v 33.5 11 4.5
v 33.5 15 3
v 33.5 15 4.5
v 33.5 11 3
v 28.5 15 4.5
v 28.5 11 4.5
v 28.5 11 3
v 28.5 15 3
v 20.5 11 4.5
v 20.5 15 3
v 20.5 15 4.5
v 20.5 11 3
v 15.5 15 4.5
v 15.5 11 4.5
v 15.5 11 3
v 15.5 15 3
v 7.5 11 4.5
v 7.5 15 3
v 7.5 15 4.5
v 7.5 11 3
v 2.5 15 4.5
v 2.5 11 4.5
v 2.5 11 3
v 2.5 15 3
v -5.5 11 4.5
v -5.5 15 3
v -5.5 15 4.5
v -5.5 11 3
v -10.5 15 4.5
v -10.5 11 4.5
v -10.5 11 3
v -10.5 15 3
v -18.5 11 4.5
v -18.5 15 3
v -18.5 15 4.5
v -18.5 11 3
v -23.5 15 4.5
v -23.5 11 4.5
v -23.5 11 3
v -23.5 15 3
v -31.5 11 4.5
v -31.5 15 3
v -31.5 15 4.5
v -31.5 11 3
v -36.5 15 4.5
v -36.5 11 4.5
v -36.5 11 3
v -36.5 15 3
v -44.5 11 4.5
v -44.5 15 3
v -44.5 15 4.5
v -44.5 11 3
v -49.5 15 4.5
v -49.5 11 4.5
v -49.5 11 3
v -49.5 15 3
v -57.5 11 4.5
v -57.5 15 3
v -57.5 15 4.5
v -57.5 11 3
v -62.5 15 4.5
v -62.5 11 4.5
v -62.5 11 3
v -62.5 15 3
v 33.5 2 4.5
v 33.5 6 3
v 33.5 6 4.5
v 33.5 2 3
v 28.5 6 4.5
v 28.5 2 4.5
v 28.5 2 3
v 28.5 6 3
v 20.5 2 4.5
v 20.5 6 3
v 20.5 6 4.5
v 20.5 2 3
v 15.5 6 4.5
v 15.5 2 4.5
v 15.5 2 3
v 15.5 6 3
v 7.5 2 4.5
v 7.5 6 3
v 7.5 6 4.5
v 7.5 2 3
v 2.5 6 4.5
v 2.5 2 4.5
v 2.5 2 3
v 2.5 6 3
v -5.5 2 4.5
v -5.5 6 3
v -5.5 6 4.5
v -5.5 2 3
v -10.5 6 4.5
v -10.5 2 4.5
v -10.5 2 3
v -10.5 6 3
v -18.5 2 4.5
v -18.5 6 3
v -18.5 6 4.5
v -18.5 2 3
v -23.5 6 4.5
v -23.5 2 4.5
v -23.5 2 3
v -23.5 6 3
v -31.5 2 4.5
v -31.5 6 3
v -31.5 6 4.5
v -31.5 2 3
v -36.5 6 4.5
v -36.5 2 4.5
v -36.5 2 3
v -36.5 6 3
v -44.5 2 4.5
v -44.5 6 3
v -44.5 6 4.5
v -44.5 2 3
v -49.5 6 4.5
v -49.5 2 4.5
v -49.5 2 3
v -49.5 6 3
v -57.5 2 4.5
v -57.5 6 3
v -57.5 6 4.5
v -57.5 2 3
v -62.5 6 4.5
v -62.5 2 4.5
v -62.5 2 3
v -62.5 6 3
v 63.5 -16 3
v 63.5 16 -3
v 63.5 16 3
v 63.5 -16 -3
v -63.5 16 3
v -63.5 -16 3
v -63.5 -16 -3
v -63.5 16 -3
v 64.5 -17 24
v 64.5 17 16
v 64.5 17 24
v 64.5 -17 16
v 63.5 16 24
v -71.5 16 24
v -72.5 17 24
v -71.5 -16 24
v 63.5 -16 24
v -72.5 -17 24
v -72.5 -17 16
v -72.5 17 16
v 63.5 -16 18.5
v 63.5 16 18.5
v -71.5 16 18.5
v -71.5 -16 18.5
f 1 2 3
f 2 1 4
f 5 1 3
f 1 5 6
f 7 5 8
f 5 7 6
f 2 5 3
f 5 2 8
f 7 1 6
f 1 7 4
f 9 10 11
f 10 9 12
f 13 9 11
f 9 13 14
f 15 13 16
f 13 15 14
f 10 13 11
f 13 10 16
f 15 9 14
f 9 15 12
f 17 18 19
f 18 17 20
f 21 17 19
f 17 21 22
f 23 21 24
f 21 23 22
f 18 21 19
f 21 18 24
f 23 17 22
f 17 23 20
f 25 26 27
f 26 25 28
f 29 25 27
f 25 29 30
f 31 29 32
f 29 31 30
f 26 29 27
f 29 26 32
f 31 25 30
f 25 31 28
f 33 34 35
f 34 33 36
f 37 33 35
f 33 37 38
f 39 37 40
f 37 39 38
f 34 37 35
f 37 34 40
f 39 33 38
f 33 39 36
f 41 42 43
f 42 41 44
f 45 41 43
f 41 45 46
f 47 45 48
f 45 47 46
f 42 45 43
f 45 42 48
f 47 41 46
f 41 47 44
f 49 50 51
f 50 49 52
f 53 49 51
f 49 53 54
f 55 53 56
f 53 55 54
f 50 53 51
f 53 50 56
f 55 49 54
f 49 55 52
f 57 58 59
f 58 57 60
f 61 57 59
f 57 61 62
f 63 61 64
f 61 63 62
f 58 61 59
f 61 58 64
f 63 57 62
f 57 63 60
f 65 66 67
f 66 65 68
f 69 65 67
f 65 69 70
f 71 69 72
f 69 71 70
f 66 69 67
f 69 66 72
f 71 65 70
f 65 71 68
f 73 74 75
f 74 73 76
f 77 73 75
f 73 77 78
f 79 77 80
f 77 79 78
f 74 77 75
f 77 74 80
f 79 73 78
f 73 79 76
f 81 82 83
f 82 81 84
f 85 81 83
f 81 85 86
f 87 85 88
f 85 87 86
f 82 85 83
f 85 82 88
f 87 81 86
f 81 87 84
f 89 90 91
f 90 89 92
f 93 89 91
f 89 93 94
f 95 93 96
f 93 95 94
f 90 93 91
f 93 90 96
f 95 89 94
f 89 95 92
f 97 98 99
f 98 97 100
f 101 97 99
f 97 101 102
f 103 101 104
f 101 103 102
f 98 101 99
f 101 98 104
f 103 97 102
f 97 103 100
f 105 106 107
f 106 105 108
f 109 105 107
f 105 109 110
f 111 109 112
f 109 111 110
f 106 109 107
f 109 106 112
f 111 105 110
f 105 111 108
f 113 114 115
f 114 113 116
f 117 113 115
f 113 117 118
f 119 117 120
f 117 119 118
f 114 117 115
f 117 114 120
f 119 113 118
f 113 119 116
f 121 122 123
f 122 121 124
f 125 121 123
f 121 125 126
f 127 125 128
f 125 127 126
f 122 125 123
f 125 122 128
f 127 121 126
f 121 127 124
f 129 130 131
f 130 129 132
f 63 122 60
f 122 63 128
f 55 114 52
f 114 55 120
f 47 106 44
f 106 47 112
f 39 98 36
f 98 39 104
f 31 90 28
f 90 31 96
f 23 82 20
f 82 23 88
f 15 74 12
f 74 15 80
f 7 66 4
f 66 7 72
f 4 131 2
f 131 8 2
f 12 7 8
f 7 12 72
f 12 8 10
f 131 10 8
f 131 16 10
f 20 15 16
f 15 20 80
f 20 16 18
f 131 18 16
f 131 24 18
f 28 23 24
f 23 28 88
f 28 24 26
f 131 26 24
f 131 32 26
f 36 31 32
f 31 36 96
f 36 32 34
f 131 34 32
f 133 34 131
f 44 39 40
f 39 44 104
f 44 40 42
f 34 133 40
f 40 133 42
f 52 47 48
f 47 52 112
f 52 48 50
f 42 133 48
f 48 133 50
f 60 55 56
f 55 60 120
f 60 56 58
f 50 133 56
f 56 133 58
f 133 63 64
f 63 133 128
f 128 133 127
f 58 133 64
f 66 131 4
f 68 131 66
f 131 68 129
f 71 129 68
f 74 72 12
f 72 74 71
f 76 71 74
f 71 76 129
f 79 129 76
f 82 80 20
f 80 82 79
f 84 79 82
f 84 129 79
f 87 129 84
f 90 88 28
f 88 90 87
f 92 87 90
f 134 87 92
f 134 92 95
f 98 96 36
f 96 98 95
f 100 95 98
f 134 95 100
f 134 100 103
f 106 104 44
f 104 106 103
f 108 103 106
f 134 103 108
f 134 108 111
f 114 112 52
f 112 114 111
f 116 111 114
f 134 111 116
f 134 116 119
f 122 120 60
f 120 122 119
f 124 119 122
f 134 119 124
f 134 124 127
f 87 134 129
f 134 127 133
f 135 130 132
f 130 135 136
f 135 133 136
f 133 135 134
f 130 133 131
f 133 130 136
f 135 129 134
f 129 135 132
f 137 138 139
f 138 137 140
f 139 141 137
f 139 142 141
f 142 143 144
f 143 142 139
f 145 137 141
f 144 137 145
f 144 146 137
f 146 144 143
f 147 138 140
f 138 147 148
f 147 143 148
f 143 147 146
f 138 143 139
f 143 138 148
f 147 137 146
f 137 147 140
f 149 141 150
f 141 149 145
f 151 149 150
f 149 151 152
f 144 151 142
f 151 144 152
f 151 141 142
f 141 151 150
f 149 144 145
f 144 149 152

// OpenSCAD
	  boardLength=127;      // including USB port protruding 
	  boardWidth=32;
	  boardHeight=6;
	  wallThickness=3;      // including USB port protruding
	  IRLength=5;         // individual IR emitter/receiver measurements including IC legs
	  IRWidth=4;          // 
	  IRHeight=2;
	  xSpaceBetweenGates=13;
	  ySpaceBetweenGates=9;
	  

	 module get_board_vol(){  
	 //Estimates the volume of the cuboid needed to fit the board in red (taking max values for height so that the USB port has enough space), space for IR sensors (bottom of board) are in yellow 
	
	      color("red")
	      cube([boardLength,boardWidth,boardHeight],center=true);
	      // make 8 yellow IR sensors
	      translate([-32,-2.5,0]) // positioning of the 8 gates
	      get_8_gates();
	      translate([-32,-2.5-ySpaceBetweenGates,0]) // positioning of the 8 gates
	      get_8_gates();	      

	      }
	module get_8_gates(){
	        for (i=[0:7])
	      translate([boardLength/2-0.5-xSpaceBetweenGates*i,boardWidth/2-0.5,boardHeight/2+0.5])
	      color("yellow")
	      cube([IRLength,IRWidth,IRHeight],center=true);
	    }
	
	get_board_vol();
translate([-4,0,0]){
   difference(){
   color("orange")
	translate([0,0,20])
	cube([boardLength+2+8,boardWidth+2,8],center=true);
   color("blue")
	translate([0,0,22])
	cube([boardLength+8,boardWidth,7],center=true);
	}
}
